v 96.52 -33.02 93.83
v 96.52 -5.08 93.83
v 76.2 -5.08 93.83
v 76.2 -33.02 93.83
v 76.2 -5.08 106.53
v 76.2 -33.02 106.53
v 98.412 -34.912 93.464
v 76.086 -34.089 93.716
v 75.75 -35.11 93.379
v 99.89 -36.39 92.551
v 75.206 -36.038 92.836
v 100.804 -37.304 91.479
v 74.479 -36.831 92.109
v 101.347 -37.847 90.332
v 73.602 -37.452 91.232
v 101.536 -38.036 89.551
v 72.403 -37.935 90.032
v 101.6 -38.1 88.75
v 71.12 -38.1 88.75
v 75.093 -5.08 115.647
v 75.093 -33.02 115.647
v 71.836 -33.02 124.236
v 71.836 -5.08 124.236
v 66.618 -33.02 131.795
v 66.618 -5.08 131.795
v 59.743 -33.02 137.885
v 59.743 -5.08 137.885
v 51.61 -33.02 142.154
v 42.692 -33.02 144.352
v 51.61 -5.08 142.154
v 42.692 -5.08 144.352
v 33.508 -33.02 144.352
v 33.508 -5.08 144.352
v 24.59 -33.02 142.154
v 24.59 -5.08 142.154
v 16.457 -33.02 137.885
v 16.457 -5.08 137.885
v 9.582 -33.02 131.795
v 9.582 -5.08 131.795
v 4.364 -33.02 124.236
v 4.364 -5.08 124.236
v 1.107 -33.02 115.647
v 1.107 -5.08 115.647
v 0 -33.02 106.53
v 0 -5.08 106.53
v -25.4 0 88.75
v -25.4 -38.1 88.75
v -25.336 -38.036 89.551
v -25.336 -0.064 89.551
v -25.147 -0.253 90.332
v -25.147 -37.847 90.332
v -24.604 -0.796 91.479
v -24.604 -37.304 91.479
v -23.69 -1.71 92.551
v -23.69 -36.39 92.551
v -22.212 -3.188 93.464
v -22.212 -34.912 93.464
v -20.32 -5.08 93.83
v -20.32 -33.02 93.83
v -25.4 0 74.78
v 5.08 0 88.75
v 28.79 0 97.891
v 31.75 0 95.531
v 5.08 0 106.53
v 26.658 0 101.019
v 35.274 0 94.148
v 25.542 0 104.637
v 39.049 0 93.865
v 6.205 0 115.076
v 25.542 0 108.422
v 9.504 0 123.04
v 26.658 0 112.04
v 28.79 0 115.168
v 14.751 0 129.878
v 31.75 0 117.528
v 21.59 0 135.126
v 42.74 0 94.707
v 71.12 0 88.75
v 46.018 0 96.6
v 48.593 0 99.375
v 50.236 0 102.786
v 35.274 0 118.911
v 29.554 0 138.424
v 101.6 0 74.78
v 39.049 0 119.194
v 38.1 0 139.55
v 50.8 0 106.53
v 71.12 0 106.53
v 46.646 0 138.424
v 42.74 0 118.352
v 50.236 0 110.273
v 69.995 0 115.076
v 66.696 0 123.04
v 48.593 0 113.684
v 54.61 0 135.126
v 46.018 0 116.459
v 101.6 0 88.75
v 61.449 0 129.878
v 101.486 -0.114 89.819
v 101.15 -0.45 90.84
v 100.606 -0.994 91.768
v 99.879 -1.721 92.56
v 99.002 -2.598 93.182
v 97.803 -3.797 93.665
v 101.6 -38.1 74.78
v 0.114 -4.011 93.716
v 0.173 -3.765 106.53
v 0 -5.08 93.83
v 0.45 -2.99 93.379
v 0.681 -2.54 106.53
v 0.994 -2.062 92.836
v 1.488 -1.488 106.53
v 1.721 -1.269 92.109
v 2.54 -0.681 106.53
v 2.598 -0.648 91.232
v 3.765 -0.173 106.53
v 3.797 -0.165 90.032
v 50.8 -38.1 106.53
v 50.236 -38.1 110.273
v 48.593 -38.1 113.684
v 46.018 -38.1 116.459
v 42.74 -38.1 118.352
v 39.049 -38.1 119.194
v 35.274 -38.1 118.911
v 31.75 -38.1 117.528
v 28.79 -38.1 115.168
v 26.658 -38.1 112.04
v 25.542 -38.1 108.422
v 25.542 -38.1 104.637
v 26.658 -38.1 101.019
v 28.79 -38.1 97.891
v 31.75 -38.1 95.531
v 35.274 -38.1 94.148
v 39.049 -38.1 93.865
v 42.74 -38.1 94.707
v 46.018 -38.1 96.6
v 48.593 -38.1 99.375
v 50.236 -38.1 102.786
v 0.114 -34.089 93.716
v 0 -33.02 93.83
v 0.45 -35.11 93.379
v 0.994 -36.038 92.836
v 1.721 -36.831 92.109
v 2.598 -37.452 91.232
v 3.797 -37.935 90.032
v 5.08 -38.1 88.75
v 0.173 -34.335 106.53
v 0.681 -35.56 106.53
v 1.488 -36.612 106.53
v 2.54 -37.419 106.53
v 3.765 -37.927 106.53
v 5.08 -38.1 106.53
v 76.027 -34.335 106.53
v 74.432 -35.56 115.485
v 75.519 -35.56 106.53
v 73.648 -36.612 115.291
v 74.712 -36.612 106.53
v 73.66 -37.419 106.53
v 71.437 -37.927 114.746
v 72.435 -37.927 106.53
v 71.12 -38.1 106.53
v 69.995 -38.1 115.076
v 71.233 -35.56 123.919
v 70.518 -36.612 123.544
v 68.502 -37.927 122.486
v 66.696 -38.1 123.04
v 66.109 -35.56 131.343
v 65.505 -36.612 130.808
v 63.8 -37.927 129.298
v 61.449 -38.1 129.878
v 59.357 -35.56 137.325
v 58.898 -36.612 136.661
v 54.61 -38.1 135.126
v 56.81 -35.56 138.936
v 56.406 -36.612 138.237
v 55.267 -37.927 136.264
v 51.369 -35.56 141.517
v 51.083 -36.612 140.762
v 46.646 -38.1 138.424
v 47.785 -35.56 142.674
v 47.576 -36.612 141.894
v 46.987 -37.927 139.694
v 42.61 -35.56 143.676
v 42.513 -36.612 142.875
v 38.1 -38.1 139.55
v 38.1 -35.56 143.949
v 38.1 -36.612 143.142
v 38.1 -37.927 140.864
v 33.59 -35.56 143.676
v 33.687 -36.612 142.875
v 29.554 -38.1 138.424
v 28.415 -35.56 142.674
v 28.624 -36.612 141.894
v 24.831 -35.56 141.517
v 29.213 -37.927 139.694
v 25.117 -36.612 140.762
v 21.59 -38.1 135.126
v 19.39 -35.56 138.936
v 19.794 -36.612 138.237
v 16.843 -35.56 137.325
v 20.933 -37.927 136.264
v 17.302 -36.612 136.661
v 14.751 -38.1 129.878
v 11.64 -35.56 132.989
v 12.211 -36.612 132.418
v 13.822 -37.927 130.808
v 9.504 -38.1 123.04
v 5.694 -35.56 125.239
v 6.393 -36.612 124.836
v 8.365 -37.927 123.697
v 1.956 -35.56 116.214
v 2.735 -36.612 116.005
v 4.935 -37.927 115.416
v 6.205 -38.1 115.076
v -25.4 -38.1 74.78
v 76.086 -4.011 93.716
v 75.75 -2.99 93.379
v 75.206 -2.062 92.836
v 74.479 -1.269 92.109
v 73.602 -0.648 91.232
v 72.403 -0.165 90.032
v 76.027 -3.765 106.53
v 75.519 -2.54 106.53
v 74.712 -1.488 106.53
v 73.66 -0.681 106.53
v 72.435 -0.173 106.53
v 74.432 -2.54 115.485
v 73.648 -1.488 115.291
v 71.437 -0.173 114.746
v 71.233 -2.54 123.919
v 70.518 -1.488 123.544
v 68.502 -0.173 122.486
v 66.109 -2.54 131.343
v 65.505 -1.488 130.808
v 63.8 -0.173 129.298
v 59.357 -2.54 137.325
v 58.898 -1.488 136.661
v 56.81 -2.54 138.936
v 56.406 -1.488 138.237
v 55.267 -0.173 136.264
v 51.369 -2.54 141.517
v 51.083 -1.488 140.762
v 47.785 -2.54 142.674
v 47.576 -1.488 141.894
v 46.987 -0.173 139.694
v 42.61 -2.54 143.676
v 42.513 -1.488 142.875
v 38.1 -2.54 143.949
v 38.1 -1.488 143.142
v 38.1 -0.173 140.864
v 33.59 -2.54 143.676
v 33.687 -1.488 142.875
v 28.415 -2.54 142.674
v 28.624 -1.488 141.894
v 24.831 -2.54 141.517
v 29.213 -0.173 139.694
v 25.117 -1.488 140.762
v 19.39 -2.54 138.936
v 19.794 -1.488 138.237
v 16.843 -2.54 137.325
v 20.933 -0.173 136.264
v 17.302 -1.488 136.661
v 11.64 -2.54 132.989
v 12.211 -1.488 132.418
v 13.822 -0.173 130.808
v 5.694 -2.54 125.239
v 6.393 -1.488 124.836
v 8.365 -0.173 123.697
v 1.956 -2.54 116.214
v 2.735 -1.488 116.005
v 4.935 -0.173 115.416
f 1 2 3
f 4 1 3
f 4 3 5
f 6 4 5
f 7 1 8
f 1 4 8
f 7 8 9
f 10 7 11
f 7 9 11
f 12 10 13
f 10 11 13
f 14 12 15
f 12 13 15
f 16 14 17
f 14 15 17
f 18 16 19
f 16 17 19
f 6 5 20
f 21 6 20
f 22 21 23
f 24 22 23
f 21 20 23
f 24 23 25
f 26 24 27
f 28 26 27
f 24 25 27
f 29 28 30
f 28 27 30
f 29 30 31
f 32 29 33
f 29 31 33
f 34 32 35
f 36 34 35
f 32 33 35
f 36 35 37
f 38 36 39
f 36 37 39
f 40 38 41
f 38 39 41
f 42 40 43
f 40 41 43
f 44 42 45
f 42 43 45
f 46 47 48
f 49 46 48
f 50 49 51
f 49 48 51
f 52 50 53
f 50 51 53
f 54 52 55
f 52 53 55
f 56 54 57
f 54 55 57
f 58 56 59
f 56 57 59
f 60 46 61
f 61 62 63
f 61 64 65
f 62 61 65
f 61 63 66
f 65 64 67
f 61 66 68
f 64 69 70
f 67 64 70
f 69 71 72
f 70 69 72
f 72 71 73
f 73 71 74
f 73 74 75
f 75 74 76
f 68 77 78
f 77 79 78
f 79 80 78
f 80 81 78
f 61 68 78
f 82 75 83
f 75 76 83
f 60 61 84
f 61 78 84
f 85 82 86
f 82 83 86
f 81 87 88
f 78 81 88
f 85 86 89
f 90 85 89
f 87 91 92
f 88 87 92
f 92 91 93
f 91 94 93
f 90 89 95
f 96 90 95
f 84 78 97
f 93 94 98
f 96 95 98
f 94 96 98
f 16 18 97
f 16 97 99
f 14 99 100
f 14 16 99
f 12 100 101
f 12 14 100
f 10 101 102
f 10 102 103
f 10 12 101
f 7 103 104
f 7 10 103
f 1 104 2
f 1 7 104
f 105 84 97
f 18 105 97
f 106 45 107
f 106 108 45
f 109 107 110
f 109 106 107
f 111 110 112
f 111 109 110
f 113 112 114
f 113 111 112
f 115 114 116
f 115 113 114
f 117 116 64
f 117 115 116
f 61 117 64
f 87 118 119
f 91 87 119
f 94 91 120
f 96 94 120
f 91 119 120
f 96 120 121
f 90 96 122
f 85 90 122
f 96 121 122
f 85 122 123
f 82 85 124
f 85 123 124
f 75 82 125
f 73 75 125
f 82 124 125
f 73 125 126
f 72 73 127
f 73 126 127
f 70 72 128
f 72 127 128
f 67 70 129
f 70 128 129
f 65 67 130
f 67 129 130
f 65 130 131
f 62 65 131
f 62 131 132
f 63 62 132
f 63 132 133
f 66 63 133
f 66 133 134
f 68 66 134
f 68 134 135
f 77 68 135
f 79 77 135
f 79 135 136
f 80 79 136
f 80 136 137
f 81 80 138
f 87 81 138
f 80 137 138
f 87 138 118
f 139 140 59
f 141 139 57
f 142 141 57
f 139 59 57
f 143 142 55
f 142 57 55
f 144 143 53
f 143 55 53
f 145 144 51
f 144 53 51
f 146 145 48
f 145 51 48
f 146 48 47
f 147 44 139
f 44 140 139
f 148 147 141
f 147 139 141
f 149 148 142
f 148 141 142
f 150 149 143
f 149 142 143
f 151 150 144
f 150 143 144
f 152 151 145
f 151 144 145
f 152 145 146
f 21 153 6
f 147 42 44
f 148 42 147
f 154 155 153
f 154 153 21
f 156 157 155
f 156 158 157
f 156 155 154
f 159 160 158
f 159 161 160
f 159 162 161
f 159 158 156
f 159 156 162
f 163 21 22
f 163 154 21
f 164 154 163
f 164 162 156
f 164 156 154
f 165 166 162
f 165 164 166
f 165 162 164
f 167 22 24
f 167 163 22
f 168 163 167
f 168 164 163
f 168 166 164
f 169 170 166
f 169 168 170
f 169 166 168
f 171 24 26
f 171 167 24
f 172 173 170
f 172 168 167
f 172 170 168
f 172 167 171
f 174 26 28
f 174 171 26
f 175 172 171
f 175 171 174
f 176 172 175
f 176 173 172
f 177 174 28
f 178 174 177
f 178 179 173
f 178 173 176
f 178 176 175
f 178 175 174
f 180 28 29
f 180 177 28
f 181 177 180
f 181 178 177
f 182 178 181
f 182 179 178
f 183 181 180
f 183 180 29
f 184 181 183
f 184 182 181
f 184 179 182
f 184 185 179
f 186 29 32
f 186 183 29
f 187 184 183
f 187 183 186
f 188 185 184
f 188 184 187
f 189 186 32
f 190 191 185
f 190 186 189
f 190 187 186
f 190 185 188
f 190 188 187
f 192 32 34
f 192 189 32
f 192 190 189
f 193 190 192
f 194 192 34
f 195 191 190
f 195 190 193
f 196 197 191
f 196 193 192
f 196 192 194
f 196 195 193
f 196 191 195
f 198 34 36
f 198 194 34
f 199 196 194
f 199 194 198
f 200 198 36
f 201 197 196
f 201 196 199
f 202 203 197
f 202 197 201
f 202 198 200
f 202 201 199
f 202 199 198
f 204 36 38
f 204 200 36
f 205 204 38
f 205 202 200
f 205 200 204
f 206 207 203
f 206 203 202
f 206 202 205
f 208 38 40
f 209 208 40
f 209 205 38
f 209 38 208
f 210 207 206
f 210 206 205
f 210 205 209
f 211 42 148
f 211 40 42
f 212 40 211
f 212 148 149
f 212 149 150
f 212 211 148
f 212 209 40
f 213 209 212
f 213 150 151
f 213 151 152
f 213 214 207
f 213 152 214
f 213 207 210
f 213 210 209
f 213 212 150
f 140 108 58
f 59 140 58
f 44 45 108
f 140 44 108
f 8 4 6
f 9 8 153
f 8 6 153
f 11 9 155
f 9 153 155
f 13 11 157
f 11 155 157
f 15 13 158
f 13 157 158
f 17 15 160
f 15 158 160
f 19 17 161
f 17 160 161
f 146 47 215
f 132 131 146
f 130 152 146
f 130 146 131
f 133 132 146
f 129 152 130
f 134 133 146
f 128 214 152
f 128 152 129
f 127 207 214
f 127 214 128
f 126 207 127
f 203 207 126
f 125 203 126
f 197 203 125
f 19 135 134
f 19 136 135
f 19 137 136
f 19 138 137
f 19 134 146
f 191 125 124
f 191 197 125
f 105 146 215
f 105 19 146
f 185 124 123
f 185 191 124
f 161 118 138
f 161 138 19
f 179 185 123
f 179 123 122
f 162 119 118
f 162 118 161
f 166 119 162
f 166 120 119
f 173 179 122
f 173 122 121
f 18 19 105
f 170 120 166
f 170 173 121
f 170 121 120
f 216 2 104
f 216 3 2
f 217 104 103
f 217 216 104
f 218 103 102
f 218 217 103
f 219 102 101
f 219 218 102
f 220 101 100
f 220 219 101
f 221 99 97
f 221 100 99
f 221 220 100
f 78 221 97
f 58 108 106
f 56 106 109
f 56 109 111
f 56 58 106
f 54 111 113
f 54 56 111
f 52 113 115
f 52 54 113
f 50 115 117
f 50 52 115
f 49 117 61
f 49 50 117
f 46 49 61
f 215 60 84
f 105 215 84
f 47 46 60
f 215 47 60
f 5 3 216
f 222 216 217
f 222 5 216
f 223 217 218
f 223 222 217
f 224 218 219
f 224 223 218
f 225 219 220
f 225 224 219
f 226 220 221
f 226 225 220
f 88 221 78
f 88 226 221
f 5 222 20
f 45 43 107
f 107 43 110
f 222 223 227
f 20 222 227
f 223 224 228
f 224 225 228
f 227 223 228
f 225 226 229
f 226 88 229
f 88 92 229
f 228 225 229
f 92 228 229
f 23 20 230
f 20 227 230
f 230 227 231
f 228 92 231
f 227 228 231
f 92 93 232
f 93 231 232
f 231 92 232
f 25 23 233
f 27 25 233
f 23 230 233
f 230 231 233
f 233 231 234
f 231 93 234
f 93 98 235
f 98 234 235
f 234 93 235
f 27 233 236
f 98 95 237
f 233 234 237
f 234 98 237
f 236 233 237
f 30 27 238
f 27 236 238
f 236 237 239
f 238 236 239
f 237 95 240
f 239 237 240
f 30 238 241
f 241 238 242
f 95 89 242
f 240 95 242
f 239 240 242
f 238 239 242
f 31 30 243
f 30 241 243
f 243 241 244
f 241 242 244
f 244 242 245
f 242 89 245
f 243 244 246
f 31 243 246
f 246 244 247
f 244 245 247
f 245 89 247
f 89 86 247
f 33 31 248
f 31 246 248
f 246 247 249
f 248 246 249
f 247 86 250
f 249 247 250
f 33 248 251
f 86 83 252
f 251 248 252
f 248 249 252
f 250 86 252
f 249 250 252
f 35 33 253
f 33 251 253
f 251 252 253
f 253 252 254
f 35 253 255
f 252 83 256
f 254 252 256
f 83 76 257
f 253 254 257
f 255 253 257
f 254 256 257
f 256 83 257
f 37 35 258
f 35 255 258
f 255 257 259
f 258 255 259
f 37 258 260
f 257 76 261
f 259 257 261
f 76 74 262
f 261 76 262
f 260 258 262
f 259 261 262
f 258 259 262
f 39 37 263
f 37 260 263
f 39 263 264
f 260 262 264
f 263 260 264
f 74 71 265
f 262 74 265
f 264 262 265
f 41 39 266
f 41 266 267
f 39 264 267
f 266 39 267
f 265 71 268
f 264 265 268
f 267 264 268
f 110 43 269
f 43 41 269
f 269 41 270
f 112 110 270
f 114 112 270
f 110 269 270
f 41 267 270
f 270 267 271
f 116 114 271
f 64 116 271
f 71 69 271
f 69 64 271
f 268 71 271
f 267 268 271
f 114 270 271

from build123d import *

# Parameters (mm, degrees)
F1_DEPTH = 38.1
F2_R     = 5.08
F3_R     = 12.7
F4_DEPTH = 38.1


with BuildPart() as f1:
    # F0 (on Front) → F1 (new body)
    with BuildSketch(Plane.XZ):
        with BuildLine():
            Line((-25.4, 93.829548), (-25.4, 74.779548))
            Line((-25.4, 74.779548), (101.6, 74.779548))
            Line((101.6, 74.779548), (101.6, 93.829548))
            Line((101.6, 93.829548), (76.2, 93.829548))
            Line((76.2, 93.829548), (76.2, 106.529548))
            ThreePointArc((76.2, 106.529548), (38.1, 144.629548), (0, 106.529548))
            Line((0, 106.529548), (0, 93.829548))
            Line((0, 93.829548), (-25.4, 93.829548))
        make_face()
    extrude(amount=F1_DEPTH)

    # F2
    f2_edges = [f1.edges().sort_by_distance(p)[0] for p in [
        (38.1, -38.1, 144.629548),
        (38.1, 0, 144.629548),
        (88.9, -38.1, 93.829548),
        (101.6, -19.05, 93.829548),
        (88.9, 0, 93.829548),
        (-12.7, -38.1, 93.829548),
        (-12.7, 0, 93.829548),
        (-25.4, -19.05, 93.829548),
    ]]
    fillet(f2_edges, radius=F2_R)

    # F3 (on face) → F4 (cut)
    with BuildSketch(Plane.XZ.offset(38.1)):
        with Locations((38.1, 106.529548)):
            Circle(F3_R)
    extrude(amount=-F4_DEPTH, mode=Mode.SUBTRACT)


solid = f1.part
